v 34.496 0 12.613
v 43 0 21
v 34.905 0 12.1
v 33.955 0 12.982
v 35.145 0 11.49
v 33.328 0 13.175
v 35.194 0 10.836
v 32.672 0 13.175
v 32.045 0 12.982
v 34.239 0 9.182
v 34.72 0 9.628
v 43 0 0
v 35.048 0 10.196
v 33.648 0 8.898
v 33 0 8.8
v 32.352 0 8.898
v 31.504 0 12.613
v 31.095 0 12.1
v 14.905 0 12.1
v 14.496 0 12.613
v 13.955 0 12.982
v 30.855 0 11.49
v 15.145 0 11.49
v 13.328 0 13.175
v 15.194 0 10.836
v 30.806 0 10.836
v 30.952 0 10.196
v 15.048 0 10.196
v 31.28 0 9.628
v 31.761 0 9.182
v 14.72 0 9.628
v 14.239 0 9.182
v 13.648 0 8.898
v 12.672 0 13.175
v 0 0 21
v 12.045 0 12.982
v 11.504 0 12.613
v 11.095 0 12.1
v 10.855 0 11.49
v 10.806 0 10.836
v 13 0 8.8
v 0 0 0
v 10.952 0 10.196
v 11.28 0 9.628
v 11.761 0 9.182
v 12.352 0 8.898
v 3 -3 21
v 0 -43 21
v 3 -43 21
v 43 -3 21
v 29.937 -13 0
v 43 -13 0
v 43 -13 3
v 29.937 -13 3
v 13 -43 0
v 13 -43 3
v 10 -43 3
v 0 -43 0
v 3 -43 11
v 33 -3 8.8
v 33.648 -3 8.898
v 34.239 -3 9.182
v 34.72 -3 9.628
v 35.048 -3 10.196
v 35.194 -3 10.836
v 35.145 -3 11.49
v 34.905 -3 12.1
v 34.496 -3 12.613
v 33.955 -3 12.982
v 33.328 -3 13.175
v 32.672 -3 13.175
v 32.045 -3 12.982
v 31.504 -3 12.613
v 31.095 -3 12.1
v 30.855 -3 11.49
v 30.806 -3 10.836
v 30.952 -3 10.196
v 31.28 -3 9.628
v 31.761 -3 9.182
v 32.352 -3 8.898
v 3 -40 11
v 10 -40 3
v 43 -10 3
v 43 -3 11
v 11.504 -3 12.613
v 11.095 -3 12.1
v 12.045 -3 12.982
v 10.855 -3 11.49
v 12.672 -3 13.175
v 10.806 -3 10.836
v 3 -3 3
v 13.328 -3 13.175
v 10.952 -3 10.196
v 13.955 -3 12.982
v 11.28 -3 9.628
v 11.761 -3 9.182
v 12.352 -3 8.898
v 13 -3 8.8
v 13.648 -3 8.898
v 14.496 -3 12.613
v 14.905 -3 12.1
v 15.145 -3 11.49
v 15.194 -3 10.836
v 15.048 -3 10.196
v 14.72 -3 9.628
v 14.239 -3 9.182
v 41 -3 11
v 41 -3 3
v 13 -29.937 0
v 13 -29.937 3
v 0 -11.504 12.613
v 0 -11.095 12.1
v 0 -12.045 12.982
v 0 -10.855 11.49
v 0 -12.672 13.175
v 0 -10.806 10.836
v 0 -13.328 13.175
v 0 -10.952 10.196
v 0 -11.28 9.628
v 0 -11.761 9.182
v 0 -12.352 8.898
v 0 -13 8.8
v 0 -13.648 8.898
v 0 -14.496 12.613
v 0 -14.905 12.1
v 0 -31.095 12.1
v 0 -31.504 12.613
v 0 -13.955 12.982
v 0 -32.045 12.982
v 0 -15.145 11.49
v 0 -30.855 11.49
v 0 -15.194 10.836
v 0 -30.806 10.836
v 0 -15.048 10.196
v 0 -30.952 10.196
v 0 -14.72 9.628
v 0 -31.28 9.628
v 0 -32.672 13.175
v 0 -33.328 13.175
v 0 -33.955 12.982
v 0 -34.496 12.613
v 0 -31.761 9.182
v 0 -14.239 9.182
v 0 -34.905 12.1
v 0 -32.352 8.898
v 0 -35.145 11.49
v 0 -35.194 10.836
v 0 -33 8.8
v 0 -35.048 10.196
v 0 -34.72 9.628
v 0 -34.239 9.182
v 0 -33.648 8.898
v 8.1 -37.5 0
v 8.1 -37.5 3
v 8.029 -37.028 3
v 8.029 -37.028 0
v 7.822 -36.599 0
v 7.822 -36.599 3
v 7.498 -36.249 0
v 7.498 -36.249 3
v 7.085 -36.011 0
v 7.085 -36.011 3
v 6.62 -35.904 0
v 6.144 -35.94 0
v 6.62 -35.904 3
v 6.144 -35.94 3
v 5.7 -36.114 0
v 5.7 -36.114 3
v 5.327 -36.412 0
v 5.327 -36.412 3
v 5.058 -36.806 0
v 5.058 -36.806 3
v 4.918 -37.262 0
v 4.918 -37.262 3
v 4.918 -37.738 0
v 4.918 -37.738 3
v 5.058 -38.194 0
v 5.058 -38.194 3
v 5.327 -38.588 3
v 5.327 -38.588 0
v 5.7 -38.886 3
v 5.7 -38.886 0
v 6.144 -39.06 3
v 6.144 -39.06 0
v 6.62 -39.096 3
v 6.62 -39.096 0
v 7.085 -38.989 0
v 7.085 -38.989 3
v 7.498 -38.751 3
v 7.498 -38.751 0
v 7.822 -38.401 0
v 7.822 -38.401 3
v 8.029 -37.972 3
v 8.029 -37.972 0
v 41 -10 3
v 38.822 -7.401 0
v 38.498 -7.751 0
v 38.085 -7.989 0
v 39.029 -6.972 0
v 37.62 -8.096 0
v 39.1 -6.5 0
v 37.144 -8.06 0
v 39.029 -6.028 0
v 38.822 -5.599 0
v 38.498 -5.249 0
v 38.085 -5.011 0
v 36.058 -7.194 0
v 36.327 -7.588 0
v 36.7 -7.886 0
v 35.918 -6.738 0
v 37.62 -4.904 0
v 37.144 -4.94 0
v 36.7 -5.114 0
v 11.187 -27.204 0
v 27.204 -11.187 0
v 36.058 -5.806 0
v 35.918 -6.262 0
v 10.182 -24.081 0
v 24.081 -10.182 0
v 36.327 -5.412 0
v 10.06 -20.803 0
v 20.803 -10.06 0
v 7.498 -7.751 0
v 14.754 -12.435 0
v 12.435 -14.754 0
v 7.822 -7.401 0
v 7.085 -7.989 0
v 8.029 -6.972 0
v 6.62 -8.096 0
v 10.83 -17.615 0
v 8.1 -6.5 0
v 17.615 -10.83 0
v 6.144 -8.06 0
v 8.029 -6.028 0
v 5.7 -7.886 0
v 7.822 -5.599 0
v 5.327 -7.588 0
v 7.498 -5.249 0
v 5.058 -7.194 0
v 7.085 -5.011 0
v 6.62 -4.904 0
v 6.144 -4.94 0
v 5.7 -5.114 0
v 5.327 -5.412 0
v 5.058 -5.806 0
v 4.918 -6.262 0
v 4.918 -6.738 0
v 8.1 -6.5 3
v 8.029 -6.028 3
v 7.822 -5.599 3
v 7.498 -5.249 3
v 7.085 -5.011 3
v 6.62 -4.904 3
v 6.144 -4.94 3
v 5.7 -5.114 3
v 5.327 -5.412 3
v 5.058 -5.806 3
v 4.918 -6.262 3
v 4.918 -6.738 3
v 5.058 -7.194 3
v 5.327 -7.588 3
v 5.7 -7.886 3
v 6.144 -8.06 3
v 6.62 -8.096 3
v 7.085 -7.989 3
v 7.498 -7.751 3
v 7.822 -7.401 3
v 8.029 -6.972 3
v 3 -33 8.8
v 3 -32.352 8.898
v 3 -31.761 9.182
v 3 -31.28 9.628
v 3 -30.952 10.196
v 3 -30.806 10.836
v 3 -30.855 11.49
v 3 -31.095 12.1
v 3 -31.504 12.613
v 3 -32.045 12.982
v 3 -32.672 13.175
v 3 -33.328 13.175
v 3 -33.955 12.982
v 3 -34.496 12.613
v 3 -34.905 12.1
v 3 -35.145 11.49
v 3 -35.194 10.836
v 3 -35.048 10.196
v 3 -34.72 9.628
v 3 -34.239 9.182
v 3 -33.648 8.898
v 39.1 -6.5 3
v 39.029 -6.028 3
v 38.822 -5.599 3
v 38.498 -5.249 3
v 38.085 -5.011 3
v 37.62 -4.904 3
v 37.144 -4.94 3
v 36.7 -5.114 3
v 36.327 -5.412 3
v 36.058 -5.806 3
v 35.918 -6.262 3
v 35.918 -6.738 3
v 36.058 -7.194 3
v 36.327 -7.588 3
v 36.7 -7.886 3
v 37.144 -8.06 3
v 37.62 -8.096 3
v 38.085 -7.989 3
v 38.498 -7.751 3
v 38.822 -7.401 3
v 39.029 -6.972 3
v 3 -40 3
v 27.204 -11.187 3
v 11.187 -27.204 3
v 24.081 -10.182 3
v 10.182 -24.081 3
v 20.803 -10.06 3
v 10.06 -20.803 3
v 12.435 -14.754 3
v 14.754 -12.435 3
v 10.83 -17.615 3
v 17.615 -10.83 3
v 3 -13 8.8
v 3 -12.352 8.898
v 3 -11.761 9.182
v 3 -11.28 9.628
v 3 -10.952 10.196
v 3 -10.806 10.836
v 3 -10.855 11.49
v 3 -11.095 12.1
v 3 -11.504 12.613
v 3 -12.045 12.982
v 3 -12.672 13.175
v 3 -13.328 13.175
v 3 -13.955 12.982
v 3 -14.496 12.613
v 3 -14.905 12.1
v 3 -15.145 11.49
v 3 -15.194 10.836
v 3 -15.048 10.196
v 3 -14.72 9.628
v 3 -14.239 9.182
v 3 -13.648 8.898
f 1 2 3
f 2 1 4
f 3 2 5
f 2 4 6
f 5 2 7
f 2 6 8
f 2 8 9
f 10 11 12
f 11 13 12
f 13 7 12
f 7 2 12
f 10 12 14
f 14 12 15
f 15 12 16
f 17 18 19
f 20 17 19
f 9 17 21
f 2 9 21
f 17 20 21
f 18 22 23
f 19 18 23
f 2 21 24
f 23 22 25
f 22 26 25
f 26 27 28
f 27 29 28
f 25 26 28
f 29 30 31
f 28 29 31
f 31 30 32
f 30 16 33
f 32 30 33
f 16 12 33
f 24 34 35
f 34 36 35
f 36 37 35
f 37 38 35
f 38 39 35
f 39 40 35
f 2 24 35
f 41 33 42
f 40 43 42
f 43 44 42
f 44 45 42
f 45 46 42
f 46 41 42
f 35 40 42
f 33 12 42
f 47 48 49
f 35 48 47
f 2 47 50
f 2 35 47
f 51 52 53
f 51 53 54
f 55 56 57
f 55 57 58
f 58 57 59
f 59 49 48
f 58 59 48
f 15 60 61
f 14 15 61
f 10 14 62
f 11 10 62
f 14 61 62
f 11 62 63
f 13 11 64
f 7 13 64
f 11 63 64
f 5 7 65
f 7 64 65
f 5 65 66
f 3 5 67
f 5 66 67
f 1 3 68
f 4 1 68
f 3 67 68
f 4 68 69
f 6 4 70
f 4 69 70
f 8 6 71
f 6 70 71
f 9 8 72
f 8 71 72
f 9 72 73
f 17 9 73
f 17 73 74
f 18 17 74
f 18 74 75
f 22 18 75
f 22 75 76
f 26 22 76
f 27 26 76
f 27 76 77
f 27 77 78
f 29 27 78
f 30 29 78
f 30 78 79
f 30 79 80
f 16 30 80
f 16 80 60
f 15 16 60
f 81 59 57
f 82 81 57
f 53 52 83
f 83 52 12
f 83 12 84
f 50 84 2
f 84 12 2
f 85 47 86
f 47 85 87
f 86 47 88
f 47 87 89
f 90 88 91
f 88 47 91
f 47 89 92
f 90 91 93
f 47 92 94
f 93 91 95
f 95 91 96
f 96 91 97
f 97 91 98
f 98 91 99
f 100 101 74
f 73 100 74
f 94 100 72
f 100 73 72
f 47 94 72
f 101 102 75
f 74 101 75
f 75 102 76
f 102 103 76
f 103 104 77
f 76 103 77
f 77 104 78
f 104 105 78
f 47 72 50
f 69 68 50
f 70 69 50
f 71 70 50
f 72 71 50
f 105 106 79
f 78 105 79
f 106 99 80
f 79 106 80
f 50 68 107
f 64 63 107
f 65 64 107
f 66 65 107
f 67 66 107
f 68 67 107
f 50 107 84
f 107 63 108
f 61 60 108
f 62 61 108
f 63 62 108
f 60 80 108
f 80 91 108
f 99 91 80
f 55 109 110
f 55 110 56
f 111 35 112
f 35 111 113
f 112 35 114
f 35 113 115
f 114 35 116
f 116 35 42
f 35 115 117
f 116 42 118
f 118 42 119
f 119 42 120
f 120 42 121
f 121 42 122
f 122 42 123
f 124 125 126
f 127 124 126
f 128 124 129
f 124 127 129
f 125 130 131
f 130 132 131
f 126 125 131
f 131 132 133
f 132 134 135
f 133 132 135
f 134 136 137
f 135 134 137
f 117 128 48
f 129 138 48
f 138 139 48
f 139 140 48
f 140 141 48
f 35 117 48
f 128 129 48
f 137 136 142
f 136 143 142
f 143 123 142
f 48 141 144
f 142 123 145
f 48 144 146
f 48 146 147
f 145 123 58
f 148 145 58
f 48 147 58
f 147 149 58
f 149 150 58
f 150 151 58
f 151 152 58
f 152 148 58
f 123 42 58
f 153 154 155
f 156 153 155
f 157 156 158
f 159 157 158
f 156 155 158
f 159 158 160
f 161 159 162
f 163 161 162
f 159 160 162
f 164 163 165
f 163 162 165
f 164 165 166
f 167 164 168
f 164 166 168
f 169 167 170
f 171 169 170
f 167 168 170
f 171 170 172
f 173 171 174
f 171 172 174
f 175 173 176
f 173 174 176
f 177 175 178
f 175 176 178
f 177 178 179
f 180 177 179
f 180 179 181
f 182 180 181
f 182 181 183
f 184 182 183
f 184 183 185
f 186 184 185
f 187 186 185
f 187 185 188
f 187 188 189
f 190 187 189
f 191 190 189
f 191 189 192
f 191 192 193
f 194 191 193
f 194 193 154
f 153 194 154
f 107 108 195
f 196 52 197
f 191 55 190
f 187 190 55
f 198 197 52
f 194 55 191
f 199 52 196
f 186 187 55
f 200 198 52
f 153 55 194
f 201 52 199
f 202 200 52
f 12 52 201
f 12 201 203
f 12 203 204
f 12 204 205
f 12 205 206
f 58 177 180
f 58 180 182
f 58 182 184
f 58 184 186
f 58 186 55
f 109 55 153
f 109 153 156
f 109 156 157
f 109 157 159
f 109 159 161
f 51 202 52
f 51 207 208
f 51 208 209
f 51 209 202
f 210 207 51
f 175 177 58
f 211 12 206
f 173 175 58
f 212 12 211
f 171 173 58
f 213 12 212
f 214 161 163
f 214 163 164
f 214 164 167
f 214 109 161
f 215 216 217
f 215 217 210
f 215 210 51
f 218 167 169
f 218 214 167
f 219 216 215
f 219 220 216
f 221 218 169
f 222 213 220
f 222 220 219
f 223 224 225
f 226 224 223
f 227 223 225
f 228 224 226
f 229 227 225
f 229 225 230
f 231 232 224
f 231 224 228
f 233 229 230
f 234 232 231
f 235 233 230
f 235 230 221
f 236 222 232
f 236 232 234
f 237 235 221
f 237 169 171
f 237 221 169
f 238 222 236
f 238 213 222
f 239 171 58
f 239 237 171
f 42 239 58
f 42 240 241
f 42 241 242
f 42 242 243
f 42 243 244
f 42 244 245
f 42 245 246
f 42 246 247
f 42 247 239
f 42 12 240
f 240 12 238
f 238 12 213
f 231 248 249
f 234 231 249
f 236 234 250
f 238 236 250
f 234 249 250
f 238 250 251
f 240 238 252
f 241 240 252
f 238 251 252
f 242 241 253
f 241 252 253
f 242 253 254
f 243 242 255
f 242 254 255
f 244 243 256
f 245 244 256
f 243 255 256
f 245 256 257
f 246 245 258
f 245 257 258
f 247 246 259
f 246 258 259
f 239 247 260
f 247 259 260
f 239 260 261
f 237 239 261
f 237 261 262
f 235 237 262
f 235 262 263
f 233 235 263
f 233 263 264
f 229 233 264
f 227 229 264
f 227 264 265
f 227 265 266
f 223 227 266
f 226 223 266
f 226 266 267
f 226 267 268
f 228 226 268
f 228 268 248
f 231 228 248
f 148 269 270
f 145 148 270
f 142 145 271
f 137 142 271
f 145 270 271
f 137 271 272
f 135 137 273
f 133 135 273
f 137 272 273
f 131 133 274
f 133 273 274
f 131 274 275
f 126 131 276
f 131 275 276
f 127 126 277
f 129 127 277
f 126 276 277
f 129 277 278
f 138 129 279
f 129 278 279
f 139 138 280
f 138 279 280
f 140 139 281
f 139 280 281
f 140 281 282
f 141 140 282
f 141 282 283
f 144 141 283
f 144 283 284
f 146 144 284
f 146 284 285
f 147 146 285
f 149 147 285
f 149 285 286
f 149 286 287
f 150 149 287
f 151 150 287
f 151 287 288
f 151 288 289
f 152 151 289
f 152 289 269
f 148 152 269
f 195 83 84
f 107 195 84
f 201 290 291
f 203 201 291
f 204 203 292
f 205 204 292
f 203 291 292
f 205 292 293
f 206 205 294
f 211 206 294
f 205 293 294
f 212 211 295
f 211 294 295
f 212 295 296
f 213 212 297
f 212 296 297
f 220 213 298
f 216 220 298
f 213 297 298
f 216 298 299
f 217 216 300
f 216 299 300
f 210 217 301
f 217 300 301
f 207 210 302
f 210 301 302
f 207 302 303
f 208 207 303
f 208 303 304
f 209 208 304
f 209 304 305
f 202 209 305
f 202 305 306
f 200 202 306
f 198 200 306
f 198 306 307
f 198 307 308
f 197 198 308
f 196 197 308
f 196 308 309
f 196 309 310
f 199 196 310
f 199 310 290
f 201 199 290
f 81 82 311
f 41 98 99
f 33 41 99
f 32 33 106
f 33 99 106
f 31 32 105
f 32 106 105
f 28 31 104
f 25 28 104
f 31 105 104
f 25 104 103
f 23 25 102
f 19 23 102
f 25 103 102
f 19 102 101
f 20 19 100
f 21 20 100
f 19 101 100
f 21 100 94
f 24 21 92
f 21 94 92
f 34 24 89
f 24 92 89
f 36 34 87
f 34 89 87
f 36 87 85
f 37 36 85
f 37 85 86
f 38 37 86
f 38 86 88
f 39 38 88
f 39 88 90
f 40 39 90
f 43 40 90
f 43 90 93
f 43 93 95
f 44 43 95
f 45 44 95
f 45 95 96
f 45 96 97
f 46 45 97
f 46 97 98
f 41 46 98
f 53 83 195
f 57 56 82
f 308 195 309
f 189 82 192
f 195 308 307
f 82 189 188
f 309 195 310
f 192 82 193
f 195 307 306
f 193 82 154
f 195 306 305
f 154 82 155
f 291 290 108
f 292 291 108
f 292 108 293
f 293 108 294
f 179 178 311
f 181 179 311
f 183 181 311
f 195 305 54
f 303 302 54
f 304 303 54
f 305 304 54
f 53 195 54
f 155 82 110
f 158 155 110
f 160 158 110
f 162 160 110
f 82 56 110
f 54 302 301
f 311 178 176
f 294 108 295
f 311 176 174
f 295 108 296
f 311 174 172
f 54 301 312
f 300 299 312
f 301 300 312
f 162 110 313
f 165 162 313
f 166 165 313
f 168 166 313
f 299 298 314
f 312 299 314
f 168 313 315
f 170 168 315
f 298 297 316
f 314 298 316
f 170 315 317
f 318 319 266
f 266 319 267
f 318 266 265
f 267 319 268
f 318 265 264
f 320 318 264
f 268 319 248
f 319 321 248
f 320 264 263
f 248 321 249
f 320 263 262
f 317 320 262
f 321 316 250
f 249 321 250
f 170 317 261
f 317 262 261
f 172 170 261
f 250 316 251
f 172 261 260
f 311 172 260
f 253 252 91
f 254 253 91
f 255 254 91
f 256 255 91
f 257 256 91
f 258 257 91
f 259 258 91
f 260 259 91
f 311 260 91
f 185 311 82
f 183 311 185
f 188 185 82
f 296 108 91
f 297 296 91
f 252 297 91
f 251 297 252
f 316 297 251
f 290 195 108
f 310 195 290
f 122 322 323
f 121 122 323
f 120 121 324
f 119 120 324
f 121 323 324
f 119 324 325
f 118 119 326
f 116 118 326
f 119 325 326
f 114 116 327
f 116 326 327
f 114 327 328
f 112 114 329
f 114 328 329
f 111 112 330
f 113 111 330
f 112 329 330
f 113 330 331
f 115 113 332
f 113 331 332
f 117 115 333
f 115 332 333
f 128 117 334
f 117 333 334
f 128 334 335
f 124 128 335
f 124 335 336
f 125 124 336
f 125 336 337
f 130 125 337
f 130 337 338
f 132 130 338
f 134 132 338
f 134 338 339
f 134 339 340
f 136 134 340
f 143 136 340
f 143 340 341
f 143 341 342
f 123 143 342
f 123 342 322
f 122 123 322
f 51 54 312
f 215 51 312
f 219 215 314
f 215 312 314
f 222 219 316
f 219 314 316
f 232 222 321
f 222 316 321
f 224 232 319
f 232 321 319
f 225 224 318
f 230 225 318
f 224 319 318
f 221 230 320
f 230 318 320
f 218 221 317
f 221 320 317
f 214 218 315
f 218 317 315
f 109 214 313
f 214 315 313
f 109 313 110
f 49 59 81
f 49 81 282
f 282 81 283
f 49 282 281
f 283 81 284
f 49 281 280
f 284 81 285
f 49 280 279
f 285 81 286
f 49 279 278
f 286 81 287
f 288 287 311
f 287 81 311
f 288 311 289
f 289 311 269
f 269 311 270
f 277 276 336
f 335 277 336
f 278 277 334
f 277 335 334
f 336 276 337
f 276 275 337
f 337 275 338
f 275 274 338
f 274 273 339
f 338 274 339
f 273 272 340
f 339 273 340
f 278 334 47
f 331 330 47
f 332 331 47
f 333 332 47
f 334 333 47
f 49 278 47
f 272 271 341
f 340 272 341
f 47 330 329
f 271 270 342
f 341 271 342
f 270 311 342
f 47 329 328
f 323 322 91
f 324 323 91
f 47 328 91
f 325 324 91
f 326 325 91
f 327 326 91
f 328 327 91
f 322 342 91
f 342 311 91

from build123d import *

# Parameters (mm, degrees)
BOSS_EXTRUDE1_DEPTH = 3
BOSS_EXTRUDE2_DEPTH = 18
SKETCH3_R           = 12
CUT_EXTRUDE1_DEPTH  = 64.419239983
SKETCH4_R           = 1.6
CUT_EXTRUDE2_DEPTH  = 64.419239983
BOSS_EXTRUDE3_DEPTH = 2
BOSS_EXTRUDE4_DEPTH = 3
SKETCH7_R           = 2.2
CUT_EXTRUDE3_DEPTH  = 63.369864518
SKETCH8_R           = 2.2
CUT_EXTRUDE4_DEPTH  = 63.369864518


with BuildPart() as part:
    # Sketch1 → Boss-Extrude1 (new body)
    with BuildSketch(Plane.XY):
        Polygon((0, -43), (0, 0), (43, 0), (43, -13), (19, -13), (13, -19), (13, -43), align=None)
    extrude(amount=BOSS_EXTRUDE1_DEPTH)

    # Sketch2 → Boss-Extrude2 (add)
    with BuildSketch(Plane.XY.offset(3)):
        Polygon((0, -43), (3, -43), (3, -3), (43, -3), (43, 0), (0, 0), align=None)
    extrude(amount=BOSS_EXTRUDE2_DEPTH)

    # Sketch3 → Cut-Extrude1 (cut, through all)
    with BuildSketch(Plane.XY.offset(3)):
        with Locations((22, -22)):
            Circle(SKETCH3_R)
    extrude(amount=-CUT_EXTRUDE1_DEPTH, mode=Mode.SUBTRACT)

    # Sketch4 → Cut-Extrude2 (cut, through all)
    with BuildSketch(Plane.XY.offset(3)):
        with Locations((6.5, -6.5)):
            Circle(SKETCH4_R)
        with Locations((37.5, -6.5)):
            Circle(SKETCH4_R)
        with Locations((6.5, -37.5)):
            Circle(SKETCH4_R)
    extrude(amount=-CUT_EXTRUDE2_DEPTH, mode=Mode.SUBTRACT)

    # Sketch5 → Boss-Extrude3 (add)
    with BuildSketch(Plane(origin=(43, 0, 0), x_dir=(0, 0, -1), z_dir=(1, 0, 0))):
        Polygon((-3, -10), (-11, -3), (-3, -3), align=None)
    extrude(amount=-BOSS_EXTRUDE3_DEPTH)

    # Sketch6 → Boss-Extrude4 (add)
    with BuildSketch(Plane.XZ.offset(43)):
        Polygon((3, 11), (10, 3), (3, 3), align=None)
    extrude(amount=-BOSS_EXTRUDE4_DEPTH)

    # Sketch7 → Cut-Extrude3 (cut, through all)
    with BuildSketch(Plane.XZ.offset(3)):
        with Locations(Location((13, 11, 0), (0, 0, 270))):
            Circle(SKETCH7_R)
        with Locations(Location((33, 11, 0), (0, 0, 270))):
            Circle(SKETCH7_R)
    extrude(amount=-CUT_EXTRUDE3_DEPTH, mode=Mode.SUBTRACT)

    # Sketch8 → Cut-Extrude4 (cut, through all)
    with BuildSketch(Plane(origin=(3, 0, 0), x_dir=(0, 0, -1), z_dir=(1, 0, 0))):
        with Locations((-11, -33)):
            Circle(SKETCH8_R)
        with Locations((-11, -13)):
            Circle(SKETCH8_R)
    extrude(amount=-CUT_EXTRUDE4_DEPTH, mode=Mode.SUBTRACT)


solid = part.part
